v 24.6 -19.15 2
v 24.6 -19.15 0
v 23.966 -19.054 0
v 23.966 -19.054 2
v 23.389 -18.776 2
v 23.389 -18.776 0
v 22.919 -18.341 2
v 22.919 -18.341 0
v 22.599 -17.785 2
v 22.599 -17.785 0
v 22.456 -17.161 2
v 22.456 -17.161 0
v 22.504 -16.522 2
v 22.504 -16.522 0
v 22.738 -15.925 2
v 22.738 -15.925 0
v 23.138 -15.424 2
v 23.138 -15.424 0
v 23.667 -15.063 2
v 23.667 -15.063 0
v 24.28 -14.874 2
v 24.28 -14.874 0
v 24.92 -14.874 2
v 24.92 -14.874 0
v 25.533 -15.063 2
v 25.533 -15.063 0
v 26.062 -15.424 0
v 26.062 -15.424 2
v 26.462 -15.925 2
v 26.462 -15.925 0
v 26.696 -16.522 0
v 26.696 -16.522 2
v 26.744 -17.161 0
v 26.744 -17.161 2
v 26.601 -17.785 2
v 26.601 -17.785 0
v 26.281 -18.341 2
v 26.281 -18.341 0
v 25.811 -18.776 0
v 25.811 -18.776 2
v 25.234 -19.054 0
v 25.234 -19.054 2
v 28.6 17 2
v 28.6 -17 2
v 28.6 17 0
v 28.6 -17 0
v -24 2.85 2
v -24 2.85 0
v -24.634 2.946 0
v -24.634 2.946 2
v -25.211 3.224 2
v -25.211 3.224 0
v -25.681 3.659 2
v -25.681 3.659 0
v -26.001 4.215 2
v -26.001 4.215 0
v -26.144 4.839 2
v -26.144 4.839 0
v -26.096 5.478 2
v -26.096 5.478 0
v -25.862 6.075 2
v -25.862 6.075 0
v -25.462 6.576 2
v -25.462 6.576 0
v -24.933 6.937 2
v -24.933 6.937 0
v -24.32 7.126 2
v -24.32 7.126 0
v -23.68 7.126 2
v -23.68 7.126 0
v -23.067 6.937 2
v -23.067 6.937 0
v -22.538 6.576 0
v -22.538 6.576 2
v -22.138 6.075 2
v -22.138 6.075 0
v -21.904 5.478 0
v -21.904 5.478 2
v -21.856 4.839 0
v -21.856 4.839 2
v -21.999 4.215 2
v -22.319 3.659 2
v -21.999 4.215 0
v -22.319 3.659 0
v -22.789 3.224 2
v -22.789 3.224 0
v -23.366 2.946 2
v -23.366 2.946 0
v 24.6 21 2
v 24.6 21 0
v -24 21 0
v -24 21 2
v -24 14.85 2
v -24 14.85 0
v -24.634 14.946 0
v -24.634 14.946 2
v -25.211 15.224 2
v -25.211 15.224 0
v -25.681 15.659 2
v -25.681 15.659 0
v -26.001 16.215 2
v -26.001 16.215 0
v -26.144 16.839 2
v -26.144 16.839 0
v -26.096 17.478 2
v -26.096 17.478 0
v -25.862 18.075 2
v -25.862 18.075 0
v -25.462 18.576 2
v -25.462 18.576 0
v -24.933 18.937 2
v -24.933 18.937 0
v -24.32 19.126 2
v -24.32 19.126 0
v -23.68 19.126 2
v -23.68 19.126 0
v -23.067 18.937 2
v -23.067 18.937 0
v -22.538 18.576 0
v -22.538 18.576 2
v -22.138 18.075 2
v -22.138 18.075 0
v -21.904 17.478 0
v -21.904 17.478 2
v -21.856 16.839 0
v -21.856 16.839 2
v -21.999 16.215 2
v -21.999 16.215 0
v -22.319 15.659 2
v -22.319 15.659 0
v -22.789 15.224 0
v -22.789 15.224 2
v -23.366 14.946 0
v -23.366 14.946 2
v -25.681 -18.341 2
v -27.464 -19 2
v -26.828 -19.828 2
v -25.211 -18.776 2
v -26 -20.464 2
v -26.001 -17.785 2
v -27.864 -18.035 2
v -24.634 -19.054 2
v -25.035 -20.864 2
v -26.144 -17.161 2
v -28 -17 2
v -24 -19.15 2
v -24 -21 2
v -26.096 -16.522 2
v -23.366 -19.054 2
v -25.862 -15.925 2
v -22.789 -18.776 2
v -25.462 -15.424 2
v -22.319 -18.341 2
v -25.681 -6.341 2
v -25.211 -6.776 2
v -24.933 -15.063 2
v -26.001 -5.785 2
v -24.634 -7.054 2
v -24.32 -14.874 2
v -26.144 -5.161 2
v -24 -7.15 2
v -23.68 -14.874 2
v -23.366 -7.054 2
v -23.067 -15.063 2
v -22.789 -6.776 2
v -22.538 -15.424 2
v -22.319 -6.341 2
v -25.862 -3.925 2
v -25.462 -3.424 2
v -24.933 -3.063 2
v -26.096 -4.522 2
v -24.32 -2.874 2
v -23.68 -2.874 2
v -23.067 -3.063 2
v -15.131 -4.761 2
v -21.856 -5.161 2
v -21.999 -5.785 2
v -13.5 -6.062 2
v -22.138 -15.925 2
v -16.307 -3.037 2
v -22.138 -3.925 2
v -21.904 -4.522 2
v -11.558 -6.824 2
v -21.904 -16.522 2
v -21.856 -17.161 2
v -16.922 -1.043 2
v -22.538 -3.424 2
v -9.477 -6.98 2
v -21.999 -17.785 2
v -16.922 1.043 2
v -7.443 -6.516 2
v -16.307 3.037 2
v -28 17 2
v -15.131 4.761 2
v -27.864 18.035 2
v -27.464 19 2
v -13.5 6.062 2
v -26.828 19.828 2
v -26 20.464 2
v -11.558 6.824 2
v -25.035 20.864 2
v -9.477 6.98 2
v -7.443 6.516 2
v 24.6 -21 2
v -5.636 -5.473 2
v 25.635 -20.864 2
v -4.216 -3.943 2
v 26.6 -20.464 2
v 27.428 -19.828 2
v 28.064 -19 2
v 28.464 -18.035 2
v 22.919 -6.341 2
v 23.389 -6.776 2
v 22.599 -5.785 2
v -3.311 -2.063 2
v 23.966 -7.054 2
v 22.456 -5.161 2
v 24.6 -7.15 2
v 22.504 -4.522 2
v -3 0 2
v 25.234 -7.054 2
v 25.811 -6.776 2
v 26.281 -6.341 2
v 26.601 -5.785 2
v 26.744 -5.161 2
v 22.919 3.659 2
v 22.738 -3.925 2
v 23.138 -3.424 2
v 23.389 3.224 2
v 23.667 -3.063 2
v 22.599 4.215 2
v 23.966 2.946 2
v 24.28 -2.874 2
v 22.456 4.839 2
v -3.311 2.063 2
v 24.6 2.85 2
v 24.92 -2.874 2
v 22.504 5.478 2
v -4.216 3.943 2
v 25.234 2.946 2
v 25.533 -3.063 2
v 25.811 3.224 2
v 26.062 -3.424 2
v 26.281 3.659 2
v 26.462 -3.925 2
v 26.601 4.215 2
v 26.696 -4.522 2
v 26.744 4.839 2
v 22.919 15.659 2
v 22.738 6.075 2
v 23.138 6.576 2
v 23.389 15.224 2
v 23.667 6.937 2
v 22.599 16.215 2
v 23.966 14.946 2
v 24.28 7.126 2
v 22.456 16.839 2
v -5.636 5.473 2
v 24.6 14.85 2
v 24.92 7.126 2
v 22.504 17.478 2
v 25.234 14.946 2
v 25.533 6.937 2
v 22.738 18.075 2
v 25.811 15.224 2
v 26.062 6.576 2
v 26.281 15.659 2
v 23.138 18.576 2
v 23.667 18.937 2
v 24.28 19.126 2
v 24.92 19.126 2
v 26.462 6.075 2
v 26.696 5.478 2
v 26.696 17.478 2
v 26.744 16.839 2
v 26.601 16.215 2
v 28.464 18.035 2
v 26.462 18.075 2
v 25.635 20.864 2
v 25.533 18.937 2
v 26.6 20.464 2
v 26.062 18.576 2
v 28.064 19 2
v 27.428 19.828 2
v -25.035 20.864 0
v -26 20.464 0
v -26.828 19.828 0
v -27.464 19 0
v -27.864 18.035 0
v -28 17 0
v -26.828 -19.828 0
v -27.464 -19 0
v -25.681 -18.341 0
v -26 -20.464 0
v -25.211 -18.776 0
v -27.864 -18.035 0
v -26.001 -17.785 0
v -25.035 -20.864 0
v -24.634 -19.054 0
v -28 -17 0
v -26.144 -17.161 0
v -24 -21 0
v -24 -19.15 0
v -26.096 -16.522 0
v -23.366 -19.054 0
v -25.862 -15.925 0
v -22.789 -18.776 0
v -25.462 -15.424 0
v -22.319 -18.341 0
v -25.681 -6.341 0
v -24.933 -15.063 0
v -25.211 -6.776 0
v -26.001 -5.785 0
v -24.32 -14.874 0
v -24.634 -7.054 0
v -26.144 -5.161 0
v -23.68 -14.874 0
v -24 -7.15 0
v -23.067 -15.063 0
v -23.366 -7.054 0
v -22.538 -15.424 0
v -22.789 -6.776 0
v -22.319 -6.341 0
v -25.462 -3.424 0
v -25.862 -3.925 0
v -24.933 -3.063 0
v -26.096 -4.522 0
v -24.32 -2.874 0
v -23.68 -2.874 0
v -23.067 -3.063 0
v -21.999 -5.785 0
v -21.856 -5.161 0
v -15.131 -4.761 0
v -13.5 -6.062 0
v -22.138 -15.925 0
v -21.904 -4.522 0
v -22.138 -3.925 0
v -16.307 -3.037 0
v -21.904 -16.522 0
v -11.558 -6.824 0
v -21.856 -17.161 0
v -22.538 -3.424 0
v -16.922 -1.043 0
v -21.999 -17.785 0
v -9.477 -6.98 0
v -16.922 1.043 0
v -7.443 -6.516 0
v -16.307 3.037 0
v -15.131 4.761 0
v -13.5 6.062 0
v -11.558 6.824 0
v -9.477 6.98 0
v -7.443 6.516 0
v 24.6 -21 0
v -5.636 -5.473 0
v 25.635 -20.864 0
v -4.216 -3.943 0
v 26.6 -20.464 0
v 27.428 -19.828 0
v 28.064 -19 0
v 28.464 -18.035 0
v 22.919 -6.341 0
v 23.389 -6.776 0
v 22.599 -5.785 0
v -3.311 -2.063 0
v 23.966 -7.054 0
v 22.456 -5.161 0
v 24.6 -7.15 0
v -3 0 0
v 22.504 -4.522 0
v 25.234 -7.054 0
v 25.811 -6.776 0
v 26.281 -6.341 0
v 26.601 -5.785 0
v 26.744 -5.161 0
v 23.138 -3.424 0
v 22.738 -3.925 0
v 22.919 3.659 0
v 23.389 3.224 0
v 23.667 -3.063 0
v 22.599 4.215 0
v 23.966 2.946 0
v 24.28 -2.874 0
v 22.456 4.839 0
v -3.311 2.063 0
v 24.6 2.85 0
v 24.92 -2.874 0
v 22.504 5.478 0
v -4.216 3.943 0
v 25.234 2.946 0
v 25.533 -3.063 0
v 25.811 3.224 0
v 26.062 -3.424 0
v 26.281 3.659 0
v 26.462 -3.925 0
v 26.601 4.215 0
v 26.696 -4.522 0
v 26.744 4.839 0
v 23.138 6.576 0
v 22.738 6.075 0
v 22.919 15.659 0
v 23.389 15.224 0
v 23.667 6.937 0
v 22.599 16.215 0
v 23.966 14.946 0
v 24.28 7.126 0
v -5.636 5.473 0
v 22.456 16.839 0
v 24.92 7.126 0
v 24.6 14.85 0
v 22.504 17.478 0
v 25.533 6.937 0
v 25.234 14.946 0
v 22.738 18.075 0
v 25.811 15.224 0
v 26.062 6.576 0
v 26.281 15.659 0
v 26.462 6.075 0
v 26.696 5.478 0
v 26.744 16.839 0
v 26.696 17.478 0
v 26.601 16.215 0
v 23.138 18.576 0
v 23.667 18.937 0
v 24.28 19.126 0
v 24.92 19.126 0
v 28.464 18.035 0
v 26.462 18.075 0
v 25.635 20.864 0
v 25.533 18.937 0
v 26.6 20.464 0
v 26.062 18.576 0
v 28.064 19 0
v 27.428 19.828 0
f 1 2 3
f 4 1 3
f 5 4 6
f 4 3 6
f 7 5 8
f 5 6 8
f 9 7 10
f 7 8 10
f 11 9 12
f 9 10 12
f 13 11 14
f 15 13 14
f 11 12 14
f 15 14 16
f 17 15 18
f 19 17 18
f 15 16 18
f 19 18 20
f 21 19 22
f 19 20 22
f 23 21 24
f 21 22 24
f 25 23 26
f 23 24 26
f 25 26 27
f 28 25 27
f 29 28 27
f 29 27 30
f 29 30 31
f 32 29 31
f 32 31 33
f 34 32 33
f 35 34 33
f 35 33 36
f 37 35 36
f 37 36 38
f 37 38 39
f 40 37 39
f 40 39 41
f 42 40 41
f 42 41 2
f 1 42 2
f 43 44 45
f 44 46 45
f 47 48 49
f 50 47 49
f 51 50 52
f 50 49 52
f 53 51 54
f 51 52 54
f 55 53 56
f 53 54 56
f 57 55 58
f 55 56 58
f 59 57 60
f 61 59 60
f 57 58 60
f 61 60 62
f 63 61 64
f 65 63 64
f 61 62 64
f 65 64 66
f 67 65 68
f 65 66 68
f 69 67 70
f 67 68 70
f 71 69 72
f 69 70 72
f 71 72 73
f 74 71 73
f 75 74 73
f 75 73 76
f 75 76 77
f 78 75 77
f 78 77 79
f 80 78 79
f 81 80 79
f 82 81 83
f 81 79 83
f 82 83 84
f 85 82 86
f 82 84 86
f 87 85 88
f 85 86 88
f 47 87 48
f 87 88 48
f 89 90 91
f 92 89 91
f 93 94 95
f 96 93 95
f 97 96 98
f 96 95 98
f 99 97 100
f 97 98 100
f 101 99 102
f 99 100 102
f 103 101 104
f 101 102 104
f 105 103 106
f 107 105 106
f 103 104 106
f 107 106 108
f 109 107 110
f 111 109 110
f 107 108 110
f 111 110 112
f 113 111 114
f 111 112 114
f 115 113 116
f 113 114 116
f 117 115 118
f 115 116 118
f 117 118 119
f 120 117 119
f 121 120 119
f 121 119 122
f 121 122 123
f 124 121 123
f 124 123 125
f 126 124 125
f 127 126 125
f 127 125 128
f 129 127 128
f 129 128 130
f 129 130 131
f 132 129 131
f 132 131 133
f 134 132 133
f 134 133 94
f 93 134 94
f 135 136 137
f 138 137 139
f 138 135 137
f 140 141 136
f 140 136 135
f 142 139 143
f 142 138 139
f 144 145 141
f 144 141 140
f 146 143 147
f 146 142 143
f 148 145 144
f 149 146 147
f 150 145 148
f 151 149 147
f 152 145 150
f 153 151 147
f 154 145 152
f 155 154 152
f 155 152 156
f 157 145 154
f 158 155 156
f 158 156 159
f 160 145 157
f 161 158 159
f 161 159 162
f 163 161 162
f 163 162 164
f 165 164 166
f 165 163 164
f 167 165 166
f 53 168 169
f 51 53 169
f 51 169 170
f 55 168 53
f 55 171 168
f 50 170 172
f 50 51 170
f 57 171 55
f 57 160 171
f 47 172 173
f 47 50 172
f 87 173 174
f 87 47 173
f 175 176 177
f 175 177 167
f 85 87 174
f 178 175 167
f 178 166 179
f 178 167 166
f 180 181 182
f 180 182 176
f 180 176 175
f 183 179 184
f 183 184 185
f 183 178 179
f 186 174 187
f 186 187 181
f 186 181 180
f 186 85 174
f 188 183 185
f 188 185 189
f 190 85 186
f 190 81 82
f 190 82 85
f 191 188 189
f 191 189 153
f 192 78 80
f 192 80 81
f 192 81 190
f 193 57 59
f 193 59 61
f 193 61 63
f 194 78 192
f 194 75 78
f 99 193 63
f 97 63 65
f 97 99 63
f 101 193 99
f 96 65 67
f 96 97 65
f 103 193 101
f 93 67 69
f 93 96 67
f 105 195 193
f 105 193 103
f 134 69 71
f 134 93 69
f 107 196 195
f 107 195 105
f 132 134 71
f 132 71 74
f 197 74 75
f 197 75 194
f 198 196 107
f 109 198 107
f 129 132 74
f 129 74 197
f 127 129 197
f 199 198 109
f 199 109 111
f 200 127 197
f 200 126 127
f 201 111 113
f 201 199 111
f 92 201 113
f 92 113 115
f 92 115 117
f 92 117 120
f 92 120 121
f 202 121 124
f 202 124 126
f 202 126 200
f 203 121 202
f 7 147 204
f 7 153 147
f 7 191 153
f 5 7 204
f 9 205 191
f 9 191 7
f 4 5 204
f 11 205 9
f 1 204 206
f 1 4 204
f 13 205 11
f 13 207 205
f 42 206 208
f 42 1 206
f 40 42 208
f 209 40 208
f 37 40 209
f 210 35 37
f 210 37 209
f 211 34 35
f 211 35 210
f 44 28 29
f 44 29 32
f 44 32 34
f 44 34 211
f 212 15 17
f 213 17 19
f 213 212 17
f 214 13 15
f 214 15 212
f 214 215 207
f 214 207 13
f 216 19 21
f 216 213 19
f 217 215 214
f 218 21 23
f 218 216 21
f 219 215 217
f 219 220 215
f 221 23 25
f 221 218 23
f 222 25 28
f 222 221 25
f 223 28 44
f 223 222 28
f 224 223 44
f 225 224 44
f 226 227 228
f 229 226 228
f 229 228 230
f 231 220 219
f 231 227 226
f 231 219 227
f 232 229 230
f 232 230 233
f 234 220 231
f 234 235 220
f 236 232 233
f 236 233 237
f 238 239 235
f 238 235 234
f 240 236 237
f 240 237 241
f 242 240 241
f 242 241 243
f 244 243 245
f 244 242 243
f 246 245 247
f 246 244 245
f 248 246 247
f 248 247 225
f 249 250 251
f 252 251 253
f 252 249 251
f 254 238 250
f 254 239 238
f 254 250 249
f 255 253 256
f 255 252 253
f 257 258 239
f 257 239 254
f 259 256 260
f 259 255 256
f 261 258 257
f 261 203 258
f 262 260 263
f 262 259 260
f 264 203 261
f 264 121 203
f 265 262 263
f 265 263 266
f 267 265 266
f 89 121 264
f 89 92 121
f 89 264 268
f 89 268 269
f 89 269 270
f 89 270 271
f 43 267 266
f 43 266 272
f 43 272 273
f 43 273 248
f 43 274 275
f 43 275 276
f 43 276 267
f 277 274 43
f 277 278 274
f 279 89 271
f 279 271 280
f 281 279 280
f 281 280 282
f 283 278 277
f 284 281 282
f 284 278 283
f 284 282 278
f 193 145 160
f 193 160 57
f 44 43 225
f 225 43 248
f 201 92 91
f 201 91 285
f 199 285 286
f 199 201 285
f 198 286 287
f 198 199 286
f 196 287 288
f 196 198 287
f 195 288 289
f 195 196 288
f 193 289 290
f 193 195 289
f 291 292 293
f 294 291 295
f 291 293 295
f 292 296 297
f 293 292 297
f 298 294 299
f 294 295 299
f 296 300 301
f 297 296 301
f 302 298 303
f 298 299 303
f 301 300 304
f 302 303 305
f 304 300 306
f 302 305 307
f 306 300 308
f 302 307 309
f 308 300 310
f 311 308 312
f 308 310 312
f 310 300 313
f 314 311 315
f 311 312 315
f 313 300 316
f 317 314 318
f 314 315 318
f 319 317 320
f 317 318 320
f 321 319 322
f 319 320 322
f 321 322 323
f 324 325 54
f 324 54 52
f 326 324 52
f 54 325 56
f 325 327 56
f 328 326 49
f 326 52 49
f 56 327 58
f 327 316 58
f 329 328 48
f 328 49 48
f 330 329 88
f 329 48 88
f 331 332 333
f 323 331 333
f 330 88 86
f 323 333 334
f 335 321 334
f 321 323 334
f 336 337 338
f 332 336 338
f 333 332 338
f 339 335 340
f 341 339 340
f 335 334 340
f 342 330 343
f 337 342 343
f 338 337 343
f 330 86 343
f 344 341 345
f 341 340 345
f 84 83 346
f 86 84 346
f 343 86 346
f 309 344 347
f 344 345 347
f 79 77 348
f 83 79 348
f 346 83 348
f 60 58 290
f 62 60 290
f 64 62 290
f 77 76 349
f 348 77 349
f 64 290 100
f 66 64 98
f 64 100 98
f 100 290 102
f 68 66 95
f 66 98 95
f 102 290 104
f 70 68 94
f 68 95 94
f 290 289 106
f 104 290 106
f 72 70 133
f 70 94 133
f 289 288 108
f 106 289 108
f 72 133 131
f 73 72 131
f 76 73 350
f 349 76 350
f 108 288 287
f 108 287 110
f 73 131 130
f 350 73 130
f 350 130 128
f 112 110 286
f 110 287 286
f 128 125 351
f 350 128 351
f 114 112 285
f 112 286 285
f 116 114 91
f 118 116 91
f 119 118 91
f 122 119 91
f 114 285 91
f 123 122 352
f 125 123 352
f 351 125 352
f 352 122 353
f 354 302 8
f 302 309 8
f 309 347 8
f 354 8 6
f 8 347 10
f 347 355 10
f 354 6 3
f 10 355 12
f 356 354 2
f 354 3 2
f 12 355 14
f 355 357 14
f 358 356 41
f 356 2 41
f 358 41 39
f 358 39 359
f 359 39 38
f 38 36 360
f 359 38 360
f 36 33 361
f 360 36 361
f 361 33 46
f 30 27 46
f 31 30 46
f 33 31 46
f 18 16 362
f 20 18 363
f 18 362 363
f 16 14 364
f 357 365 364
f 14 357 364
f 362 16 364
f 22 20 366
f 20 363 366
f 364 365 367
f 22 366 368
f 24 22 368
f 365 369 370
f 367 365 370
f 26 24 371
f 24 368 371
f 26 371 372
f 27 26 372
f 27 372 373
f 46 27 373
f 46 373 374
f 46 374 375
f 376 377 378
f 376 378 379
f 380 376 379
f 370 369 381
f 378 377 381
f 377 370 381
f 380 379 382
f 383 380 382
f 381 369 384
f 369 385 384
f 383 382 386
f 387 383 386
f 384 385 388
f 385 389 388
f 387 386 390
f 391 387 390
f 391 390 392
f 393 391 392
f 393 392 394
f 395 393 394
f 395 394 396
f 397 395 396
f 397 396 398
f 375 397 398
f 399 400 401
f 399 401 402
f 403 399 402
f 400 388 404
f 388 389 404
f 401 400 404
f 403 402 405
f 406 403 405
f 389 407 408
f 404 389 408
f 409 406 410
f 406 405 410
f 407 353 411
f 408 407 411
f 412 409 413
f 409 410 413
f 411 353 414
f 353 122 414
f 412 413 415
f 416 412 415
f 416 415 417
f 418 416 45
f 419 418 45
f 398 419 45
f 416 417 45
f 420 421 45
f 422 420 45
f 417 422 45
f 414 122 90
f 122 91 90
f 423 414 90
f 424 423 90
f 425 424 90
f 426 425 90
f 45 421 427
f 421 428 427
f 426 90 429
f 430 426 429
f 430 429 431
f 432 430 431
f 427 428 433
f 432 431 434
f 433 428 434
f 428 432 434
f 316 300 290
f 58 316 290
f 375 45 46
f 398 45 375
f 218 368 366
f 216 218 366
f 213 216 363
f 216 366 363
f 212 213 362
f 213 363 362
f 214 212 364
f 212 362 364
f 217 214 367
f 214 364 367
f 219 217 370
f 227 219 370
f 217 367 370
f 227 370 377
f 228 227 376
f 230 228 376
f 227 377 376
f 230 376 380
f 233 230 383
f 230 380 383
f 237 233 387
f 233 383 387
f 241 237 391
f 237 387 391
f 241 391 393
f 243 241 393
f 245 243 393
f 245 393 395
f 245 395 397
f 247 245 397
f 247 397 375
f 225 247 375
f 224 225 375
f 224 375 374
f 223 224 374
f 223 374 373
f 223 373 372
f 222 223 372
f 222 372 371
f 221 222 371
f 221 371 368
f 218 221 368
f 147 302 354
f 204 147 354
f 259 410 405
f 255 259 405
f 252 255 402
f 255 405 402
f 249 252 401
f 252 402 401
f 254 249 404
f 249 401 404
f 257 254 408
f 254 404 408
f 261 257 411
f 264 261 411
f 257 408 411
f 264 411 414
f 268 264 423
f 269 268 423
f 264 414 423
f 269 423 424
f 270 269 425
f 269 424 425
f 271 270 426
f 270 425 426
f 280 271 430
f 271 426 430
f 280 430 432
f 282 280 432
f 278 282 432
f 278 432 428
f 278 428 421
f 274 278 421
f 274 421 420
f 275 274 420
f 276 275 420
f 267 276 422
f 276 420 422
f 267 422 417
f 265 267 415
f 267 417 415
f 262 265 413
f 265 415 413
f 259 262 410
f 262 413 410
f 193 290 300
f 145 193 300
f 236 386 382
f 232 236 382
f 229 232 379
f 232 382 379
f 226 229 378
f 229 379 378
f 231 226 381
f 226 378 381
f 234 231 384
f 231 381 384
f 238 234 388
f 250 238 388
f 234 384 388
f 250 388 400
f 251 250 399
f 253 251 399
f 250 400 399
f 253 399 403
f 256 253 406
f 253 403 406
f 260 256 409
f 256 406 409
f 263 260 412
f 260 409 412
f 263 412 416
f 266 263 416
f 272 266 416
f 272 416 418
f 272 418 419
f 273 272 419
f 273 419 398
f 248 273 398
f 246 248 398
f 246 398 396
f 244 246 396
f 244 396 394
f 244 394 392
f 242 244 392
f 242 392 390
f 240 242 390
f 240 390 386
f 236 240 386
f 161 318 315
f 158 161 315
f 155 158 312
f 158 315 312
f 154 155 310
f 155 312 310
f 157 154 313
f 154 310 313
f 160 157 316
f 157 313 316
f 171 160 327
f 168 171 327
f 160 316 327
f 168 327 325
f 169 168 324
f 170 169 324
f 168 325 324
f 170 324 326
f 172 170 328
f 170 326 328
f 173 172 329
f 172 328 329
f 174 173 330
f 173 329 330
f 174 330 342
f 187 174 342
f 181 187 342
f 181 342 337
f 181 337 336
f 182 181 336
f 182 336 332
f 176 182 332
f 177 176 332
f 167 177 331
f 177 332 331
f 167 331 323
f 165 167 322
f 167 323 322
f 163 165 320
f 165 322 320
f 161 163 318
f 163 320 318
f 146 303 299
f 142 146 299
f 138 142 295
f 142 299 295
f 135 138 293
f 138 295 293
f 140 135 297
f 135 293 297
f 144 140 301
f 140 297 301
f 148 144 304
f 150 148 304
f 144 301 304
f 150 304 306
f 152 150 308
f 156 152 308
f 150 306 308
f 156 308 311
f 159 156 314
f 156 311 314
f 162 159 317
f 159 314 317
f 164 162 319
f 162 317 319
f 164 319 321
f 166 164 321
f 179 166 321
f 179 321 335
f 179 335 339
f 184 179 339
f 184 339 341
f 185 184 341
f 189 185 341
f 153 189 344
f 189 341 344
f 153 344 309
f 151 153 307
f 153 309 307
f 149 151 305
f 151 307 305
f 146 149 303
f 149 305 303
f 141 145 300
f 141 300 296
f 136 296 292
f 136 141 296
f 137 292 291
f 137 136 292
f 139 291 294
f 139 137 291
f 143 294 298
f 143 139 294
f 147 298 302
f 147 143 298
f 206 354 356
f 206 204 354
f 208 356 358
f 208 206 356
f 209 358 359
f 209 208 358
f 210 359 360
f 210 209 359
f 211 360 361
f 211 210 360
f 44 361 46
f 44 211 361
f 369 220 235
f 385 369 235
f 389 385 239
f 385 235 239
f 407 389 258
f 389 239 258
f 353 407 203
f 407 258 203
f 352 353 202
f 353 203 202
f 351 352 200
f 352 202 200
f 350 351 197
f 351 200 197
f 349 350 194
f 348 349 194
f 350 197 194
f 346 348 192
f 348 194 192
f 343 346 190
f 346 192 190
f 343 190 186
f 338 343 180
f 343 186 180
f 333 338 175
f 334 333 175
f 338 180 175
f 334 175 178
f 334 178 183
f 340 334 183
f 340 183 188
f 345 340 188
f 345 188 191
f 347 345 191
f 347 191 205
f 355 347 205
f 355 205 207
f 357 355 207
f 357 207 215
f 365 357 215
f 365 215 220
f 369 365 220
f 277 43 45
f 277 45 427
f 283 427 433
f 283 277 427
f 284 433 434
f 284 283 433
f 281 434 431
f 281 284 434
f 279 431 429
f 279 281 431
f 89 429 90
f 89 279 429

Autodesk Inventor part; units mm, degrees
ref_plane "YZ Plane" through (0, 0, 0) normal (1, 0, 0) x (0, 1, 0)
ref_plane "XZ Plane" through (0, 0, 0) normal (0, 1, 0) x (-1, 0, 0)
ref_plane "XY Plane" through (0, 0, 0) normal (0, 0, 1) x (1, 0, 0)
sketch "スケッチ1" plane through (0, 0, 0) normal (0, 0, 1) x (1, 0, 0)
  line L0 (-28, -21) -> (28.6, -21)
  line L1 (28.6, -21) -> (28.6, 21)
  line L2 (28.6, 21) -> (-28, 21)
  line L3 (-28, 21) -> (-28, -21)
  point P0 (0, 0)
  dimension "d1" = 42
  dimension "d28" = 28
  dimension "d29" = 28.6
  dimension "d32" = 21
extrude "プレート1" add sketch "スケッチ1" along normal blind 2
sketch "スケッチ2" plane through (0, 0, 2) normal (0, 0, 1) x (1, 0, 0)
  line L0 (-24, -5) -> (24.6, -5)
  line L1 (24.6, -5) -> (24.6, 5)
  line L2 (24.6, 5) -> (-24, 5)
  line L3 (-24, 5) -> (-24, -5)
  line L4 (-24, -5) -> (24.6, 5) construction
  line L5 (24.6, -5) -> (-24, 5) construction
  line L6 (28.6, -21) -> (-28, -21) projected
  line L7 (-28, -21) -> (-28, 21) projected
  line L8 (28.6, -21) -> (-28, -21) projected
  line L9 (28.6, 21) -> (28.6, -21) projected
  line L10 (-28, 21) -> (28.6, 21) projected
  circle A0 centre (-10, 0) radius 7
  point P0 (0.3, 0)
  point P1 (0.3, 0)
  point P2 (0.3, 0)
  point P3 (0, 0)
  dimension "d3" = 48.6
  dimension "d5" = 10
  dimension "d16" = 14
  dimension "d31" = 14
  dimension "d33" = 4
  dimension "d34" = 0
hole "穴1" at (24.6, 5, 2) at (24.6, -5, 2) at (-24, 5, 2) at (-24, -5, 2) direction (0, 0, -1) diameter 4.3 end through all clearance for "Socket Head Cap Screw" size "M4" standard "Ansi Metric M Profile"
extrude "押し出し1" cut sketch "スケッチ2" against normal blind 10 contours A0 L2 L0 | L0 A0 | A0 L2
sketch "スケッチ3" plane through (0, 0, 2) normal (0, 0, 1) x (1, 0, 0)
  line L0 (-28, 21) -> (28.6, 21) projected
  line L1 (-28, -21) -> (-28, 21) projected
  line L2 (28.6, -21) -> (-28, -21) projected
  line L3 (28.6, 21) -> (28.6, -21) projected
  line L4 (24.6, 17) -> (-24, 17)
  line L5 (-24, 17) -> (-24, -17)
  line L6 (-24, -17) -> (24.6, -17)
  line L7 (24.6, -17) -> (24.6, 17)
  point P0 (0, 0)
  dimension "d19" = 4
hole "穴2" at (-24, 17, 2) at (-24, -17, 2) at (24.6, 17, 2) at (24.6, -17, 2) direction (0, 0, -1) diameter 4.3 end through all clearance for "Socket Head Cap Screw" size "M4" standard "Ansi Metric M Profile"
fillet "コーナーR1" radius 4 4 edges at (28.6, 21, 1) (-28, 21, 1) (-28, -21, 1) (28.6, -21, 1)
equation "\"d14\" = Thickness"
equation "\"d2\" = Thickness"
equation "\"d32\" = 0.5 * d1"
equation "\"BendRadius\" = Thickness"
equation "\"BendReliefWidth\" = Thickness"
equation "\"BendReliefDepth\" = 0.5 * Thickness"
equation "\"CornerReliefSize\" = 4 * Thickness"
equation "\"MinimumRemnant\" = 2 * Thickness"
equation "\"TransitionRadius\" = BendRadius"
equation "\"JacobiRadiusSize\" = BendRadius"
equation "\"GapSize\" = Thickness"
equation "\"Thickness\" = 2"
properties part number "s_carbon_plate4" material "CFRP"
